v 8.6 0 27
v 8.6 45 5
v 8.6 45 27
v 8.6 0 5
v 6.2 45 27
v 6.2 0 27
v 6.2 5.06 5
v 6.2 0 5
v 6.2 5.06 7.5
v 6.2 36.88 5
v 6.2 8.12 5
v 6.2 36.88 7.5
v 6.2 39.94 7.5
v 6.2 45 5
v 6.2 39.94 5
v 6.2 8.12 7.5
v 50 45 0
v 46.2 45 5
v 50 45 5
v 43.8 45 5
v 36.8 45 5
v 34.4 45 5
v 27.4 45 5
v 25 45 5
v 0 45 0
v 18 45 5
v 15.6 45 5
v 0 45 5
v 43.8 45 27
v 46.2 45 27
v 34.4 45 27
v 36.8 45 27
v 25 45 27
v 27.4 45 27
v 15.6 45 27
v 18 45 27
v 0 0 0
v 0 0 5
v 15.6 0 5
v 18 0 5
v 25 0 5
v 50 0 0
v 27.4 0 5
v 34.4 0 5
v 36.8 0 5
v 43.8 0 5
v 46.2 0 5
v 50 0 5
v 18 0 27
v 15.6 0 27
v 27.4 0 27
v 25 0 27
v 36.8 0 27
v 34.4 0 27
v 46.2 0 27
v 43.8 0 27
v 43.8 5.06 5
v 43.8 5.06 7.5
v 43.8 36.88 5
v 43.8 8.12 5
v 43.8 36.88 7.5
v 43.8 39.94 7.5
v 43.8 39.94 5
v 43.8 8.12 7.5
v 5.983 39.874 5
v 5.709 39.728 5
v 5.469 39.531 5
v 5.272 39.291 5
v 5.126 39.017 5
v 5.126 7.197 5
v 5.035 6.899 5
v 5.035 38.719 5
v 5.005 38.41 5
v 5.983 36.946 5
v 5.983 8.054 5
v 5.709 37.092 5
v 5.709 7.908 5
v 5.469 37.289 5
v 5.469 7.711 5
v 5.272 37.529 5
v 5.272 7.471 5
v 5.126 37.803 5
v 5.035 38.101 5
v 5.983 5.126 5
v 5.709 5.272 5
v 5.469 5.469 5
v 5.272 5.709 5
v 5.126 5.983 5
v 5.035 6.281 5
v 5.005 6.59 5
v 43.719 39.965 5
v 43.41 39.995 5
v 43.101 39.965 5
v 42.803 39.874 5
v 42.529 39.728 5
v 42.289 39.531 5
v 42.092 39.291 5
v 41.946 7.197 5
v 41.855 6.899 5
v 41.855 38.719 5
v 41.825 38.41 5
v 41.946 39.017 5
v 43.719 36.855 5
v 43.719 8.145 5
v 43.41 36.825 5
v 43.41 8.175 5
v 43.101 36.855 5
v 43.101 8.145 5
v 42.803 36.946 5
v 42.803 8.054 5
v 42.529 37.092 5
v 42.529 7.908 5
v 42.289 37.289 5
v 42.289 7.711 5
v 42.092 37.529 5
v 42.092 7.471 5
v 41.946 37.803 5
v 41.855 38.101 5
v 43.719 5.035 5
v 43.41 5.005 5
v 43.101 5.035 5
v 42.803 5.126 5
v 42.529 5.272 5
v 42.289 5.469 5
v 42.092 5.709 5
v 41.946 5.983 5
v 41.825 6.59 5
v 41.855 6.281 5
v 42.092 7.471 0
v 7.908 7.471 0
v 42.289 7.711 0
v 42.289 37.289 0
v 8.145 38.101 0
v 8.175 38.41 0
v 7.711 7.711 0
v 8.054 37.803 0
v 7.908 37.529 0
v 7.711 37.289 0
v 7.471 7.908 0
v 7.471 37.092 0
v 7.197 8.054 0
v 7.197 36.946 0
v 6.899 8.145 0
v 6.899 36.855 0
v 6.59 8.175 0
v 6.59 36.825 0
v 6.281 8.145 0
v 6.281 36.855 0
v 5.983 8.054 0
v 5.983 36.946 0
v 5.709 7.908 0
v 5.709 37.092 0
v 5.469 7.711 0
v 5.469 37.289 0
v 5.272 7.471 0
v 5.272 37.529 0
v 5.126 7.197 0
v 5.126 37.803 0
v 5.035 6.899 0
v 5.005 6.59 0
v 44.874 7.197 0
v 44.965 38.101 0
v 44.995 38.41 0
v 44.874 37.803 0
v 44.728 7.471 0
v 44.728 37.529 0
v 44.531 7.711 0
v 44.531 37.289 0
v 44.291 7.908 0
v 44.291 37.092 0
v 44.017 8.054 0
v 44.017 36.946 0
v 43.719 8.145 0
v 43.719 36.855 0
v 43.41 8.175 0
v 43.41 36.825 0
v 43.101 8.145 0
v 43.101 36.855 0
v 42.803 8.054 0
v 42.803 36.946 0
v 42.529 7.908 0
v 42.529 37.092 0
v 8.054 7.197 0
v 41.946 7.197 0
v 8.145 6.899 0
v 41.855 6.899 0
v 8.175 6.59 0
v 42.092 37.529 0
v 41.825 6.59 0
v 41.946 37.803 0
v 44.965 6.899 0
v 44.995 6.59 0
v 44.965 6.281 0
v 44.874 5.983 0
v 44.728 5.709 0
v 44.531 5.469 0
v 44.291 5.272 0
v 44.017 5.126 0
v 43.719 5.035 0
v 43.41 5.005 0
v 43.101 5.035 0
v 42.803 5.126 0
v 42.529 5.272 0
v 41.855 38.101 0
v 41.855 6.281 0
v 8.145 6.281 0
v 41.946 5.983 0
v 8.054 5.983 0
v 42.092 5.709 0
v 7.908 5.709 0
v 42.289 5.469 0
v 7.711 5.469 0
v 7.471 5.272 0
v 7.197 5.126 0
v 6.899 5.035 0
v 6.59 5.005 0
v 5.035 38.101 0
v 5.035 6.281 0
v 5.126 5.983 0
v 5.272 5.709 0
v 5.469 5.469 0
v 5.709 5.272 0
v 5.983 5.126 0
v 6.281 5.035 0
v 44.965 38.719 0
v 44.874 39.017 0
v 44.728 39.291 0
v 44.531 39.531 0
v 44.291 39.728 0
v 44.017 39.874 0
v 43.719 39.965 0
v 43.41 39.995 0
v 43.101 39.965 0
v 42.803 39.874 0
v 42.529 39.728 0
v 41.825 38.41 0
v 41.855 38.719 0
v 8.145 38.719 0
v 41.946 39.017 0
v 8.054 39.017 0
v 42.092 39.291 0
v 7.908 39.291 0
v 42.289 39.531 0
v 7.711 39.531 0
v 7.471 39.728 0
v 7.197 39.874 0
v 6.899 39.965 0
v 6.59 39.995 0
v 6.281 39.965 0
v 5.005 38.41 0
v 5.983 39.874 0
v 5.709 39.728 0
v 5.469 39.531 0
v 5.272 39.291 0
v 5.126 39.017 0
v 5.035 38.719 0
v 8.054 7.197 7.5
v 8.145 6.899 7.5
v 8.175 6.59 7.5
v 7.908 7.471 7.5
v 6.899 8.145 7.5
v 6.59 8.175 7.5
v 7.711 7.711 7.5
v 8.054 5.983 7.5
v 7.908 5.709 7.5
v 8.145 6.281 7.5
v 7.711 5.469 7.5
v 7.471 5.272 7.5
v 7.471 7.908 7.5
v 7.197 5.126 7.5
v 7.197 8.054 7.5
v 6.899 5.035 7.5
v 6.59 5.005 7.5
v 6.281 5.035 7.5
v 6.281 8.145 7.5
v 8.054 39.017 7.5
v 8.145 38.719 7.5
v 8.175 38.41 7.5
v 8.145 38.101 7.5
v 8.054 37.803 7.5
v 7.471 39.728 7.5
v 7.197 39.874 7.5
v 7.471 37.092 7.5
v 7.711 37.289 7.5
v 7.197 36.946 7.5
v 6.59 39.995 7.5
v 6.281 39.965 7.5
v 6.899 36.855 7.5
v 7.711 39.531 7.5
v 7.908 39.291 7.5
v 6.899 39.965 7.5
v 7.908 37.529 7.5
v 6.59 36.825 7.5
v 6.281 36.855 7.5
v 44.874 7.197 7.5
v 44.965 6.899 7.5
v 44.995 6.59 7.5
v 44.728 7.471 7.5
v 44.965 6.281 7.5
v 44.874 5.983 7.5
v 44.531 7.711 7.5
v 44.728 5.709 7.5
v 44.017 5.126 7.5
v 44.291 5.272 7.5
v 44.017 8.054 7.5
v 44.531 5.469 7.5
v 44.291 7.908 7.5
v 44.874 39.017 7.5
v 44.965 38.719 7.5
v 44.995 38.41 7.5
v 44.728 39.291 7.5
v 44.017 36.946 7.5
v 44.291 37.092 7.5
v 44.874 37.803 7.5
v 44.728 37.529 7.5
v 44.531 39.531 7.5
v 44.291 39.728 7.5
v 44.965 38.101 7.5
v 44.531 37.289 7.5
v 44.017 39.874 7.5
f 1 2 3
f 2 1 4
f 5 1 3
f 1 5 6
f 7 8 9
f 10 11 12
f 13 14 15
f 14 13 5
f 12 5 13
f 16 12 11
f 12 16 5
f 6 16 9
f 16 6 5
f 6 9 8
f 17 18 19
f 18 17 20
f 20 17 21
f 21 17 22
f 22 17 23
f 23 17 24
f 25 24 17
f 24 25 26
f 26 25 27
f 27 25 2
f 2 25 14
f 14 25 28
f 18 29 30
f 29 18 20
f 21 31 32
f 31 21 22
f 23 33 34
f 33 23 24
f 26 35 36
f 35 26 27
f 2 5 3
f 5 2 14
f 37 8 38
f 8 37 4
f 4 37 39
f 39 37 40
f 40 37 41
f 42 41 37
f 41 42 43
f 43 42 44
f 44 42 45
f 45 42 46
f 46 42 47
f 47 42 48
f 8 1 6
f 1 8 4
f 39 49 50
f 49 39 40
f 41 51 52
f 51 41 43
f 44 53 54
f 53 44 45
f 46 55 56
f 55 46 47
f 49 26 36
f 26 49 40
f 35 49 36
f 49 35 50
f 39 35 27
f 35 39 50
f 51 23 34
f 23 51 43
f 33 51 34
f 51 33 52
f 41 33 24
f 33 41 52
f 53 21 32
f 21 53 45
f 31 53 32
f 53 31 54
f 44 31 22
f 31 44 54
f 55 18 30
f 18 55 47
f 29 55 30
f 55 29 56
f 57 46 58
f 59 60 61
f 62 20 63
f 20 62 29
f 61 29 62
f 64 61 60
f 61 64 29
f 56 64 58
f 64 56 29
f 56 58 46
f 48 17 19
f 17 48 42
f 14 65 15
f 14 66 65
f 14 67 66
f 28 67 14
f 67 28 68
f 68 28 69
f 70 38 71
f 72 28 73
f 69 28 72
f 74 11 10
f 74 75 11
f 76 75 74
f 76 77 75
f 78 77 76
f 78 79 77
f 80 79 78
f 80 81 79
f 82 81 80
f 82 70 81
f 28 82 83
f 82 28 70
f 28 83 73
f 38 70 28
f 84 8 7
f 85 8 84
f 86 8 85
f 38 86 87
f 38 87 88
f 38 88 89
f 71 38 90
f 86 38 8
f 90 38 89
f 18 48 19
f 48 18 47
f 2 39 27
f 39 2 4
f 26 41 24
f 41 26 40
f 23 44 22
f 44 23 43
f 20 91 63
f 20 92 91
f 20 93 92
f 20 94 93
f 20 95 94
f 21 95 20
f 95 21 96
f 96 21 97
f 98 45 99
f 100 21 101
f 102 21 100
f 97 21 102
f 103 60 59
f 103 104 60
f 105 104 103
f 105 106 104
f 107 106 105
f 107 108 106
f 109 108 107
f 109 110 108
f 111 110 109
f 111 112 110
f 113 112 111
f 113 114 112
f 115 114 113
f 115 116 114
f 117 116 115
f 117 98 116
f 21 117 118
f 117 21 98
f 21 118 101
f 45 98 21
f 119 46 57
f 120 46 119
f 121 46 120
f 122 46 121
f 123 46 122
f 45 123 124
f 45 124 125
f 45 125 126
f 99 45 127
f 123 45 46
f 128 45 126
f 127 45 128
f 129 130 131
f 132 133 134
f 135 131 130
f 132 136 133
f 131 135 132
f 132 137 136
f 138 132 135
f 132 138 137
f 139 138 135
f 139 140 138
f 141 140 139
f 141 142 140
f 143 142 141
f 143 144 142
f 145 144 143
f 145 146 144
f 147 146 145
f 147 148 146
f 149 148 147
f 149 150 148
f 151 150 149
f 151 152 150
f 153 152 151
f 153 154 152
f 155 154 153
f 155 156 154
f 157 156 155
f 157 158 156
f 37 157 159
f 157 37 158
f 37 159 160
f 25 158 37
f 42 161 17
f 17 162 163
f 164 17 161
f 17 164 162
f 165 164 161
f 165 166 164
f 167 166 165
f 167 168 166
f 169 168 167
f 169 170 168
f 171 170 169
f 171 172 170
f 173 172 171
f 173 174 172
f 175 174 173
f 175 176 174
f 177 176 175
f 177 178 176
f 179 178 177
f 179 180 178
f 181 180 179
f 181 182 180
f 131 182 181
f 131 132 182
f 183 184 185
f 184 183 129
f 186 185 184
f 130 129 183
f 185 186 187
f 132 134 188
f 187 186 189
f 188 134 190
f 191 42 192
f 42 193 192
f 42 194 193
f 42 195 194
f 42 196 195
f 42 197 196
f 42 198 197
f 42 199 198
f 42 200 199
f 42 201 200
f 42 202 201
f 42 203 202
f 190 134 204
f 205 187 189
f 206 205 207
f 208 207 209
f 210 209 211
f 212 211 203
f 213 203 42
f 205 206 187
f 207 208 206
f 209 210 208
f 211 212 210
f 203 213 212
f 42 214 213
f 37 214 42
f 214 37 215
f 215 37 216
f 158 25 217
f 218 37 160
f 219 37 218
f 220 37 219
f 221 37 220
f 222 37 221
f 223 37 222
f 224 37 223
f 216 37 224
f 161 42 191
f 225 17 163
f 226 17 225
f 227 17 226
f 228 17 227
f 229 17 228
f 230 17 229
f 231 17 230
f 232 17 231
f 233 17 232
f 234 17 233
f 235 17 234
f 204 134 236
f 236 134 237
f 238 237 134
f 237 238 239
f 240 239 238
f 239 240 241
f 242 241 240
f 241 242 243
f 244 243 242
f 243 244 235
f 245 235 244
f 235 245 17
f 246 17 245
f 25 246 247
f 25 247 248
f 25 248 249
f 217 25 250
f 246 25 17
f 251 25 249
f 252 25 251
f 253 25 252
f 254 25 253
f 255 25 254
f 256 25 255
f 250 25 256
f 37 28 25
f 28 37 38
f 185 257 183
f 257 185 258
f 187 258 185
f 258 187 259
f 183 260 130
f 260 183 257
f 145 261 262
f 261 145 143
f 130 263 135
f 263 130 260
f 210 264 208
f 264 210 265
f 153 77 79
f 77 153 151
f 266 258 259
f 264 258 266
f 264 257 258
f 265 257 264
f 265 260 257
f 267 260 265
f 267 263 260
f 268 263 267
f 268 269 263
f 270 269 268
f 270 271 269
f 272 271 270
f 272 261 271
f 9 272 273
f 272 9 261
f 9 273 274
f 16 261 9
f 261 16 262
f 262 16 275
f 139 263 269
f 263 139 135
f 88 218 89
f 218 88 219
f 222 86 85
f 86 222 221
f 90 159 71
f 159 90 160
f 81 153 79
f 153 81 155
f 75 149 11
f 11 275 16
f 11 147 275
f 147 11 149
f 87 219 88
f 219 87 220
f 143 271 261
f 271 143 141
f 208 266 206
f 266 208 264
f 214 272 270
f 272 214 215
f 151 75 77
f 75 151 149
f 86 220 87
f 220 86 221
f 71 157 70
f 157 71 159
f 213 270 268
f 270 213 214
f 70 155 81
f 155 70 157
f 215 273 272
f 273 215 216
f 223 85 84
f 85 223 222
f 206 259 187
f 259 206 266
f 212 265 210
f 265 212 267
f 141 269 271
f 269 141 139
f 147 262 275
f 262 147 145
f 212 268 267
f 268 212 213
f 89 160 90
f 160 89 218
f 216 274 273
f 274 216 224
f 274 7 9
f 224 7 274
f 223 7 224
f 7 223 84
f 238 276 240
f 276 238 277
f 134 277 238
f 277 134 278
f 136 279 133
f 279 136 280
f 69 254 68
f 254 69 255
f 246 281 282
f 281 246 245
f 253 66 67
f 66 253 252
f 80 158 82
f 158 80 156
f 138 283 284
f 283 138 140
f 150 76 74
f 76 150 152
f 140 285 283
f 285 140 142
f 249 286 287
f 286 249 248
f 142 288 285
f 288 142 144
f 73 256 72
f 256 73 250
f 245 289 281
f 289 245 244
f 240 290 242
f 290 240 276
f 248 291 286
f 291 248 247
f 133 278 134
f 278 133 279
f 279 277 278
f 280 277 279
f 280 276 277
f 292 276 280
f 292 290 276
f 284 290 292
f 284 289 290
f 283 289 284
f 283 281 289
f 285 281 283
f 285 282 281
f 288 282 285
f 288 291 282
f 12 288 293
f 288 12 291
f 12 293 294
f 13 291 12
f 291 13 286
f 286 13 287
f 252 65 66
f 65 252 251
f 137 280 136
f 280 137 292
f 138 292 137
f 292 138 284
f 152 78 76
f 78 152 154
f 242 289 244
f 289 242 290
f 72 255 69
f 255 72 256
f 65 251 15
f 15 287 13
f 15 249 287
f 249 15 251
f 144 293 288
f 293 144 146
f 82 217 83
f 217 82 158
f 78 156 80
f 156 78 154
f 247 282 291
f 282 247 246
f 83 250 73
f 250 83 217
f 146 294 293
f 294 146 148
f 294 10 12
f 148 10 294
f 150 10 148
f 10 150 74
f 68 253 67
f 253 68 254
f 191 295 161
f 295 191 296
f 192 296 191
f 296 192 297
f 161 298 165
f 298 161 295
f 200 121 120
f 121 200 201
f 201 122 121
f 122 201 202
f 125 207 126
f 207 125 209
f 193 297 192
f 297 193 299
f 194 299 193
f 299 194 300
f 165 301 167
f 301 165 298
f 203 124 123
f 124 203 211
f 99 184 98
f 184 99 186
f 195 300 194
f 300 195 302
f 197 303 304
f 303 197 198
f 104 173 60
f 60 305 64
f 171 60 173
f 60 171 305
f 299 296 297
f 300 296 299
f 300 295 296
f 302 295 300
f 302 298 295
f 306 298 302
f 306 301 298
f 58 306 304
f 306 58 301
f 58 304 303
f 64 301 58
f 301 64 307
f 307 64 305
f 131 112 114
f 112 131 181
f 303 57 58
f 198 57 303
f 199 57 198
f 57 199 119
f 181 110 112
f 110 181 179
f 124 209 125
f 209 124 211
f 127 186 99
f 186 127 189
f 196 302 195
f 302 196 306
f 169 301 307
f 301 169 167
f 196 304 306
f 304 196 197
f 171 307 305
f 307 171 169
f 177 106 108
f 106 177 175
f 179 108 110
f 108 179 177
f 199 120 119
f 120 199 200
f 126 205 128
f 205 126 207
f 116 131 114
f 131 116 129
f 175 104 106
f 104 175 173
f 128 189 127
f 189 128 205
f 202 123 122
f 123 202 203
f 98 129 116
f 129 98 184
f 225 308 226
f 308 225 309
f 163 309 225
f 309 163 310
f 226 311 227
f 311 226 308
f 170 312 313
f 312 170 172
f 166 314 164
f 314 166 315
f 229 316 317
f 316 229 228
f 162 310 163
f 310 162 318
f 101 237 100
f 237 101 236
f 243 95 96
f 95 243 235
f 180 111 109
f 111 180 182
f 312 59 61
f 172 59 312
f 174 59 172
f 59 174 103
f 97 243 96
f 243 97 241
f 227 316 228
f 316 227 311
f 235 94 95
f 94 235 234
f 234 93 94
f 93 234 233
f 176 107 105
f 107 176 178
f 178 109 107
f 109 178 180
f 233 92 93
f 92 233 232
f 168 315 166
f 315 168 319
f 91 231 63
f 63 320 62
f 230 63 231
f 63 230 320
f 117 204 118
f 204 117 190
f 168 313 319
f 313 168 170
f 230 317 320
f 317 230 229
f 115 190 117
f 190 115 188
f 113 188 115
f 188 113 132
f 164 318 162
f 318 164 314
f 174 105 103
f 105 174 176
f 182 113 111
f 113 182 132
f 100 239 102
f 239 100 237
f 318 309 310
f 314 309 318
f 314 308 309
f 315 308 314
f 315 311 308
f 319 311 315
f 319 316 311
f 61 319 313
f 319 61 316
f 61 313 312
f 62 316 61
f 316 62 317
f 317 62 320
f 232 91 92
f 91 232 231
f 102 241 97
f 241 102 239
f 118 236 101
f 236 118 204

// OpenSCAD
$fn = 32;

// ----------------------------------------------------------------------
// Finned heat sink: 50 x 45 mm base, 22 mm fins
// ----------------------------------------------------------------------

// --- parameters (mm) ---
base_w = 50;              // base width
base_d = 45;              // base depth
base_t = 5;               // base thickness
fin_h = 22;               // fin height above the base
holes_d = 3.17;           // fixing holes
hole_x = 18.41;           // hole offset in x
hole_y = 15.91;           // hole offset in y
fin_t = 2.4;              // fin thickness
fin_pitch = 9.4;          // fin pitch
fin_count = 5;            // number of fins
fin_x0 = 6.2;             // first fin offset

difference() {
  union() {
    cube([base_w, base_d, base_t]);
    for (i = [0 : fin_count - 1]) {
      translate([fin_x0 + i * fin_pitch, 0, base_t - 0.5]) cube([fin_t, base_d, fin_h + 0.5]);
    }
  }
  /* fixing holes through the base, 2.5 mm clear on both sides */
  for (hx = [-18.41, 18.41]) {
    for (hy = [-15.91, 15.91]) {
      translate([base_w / 2 + hx, base_d / 2 + hy, -2.5]) cylinder(h = base_t + 5, d = holes_d);
    }
  }
}
